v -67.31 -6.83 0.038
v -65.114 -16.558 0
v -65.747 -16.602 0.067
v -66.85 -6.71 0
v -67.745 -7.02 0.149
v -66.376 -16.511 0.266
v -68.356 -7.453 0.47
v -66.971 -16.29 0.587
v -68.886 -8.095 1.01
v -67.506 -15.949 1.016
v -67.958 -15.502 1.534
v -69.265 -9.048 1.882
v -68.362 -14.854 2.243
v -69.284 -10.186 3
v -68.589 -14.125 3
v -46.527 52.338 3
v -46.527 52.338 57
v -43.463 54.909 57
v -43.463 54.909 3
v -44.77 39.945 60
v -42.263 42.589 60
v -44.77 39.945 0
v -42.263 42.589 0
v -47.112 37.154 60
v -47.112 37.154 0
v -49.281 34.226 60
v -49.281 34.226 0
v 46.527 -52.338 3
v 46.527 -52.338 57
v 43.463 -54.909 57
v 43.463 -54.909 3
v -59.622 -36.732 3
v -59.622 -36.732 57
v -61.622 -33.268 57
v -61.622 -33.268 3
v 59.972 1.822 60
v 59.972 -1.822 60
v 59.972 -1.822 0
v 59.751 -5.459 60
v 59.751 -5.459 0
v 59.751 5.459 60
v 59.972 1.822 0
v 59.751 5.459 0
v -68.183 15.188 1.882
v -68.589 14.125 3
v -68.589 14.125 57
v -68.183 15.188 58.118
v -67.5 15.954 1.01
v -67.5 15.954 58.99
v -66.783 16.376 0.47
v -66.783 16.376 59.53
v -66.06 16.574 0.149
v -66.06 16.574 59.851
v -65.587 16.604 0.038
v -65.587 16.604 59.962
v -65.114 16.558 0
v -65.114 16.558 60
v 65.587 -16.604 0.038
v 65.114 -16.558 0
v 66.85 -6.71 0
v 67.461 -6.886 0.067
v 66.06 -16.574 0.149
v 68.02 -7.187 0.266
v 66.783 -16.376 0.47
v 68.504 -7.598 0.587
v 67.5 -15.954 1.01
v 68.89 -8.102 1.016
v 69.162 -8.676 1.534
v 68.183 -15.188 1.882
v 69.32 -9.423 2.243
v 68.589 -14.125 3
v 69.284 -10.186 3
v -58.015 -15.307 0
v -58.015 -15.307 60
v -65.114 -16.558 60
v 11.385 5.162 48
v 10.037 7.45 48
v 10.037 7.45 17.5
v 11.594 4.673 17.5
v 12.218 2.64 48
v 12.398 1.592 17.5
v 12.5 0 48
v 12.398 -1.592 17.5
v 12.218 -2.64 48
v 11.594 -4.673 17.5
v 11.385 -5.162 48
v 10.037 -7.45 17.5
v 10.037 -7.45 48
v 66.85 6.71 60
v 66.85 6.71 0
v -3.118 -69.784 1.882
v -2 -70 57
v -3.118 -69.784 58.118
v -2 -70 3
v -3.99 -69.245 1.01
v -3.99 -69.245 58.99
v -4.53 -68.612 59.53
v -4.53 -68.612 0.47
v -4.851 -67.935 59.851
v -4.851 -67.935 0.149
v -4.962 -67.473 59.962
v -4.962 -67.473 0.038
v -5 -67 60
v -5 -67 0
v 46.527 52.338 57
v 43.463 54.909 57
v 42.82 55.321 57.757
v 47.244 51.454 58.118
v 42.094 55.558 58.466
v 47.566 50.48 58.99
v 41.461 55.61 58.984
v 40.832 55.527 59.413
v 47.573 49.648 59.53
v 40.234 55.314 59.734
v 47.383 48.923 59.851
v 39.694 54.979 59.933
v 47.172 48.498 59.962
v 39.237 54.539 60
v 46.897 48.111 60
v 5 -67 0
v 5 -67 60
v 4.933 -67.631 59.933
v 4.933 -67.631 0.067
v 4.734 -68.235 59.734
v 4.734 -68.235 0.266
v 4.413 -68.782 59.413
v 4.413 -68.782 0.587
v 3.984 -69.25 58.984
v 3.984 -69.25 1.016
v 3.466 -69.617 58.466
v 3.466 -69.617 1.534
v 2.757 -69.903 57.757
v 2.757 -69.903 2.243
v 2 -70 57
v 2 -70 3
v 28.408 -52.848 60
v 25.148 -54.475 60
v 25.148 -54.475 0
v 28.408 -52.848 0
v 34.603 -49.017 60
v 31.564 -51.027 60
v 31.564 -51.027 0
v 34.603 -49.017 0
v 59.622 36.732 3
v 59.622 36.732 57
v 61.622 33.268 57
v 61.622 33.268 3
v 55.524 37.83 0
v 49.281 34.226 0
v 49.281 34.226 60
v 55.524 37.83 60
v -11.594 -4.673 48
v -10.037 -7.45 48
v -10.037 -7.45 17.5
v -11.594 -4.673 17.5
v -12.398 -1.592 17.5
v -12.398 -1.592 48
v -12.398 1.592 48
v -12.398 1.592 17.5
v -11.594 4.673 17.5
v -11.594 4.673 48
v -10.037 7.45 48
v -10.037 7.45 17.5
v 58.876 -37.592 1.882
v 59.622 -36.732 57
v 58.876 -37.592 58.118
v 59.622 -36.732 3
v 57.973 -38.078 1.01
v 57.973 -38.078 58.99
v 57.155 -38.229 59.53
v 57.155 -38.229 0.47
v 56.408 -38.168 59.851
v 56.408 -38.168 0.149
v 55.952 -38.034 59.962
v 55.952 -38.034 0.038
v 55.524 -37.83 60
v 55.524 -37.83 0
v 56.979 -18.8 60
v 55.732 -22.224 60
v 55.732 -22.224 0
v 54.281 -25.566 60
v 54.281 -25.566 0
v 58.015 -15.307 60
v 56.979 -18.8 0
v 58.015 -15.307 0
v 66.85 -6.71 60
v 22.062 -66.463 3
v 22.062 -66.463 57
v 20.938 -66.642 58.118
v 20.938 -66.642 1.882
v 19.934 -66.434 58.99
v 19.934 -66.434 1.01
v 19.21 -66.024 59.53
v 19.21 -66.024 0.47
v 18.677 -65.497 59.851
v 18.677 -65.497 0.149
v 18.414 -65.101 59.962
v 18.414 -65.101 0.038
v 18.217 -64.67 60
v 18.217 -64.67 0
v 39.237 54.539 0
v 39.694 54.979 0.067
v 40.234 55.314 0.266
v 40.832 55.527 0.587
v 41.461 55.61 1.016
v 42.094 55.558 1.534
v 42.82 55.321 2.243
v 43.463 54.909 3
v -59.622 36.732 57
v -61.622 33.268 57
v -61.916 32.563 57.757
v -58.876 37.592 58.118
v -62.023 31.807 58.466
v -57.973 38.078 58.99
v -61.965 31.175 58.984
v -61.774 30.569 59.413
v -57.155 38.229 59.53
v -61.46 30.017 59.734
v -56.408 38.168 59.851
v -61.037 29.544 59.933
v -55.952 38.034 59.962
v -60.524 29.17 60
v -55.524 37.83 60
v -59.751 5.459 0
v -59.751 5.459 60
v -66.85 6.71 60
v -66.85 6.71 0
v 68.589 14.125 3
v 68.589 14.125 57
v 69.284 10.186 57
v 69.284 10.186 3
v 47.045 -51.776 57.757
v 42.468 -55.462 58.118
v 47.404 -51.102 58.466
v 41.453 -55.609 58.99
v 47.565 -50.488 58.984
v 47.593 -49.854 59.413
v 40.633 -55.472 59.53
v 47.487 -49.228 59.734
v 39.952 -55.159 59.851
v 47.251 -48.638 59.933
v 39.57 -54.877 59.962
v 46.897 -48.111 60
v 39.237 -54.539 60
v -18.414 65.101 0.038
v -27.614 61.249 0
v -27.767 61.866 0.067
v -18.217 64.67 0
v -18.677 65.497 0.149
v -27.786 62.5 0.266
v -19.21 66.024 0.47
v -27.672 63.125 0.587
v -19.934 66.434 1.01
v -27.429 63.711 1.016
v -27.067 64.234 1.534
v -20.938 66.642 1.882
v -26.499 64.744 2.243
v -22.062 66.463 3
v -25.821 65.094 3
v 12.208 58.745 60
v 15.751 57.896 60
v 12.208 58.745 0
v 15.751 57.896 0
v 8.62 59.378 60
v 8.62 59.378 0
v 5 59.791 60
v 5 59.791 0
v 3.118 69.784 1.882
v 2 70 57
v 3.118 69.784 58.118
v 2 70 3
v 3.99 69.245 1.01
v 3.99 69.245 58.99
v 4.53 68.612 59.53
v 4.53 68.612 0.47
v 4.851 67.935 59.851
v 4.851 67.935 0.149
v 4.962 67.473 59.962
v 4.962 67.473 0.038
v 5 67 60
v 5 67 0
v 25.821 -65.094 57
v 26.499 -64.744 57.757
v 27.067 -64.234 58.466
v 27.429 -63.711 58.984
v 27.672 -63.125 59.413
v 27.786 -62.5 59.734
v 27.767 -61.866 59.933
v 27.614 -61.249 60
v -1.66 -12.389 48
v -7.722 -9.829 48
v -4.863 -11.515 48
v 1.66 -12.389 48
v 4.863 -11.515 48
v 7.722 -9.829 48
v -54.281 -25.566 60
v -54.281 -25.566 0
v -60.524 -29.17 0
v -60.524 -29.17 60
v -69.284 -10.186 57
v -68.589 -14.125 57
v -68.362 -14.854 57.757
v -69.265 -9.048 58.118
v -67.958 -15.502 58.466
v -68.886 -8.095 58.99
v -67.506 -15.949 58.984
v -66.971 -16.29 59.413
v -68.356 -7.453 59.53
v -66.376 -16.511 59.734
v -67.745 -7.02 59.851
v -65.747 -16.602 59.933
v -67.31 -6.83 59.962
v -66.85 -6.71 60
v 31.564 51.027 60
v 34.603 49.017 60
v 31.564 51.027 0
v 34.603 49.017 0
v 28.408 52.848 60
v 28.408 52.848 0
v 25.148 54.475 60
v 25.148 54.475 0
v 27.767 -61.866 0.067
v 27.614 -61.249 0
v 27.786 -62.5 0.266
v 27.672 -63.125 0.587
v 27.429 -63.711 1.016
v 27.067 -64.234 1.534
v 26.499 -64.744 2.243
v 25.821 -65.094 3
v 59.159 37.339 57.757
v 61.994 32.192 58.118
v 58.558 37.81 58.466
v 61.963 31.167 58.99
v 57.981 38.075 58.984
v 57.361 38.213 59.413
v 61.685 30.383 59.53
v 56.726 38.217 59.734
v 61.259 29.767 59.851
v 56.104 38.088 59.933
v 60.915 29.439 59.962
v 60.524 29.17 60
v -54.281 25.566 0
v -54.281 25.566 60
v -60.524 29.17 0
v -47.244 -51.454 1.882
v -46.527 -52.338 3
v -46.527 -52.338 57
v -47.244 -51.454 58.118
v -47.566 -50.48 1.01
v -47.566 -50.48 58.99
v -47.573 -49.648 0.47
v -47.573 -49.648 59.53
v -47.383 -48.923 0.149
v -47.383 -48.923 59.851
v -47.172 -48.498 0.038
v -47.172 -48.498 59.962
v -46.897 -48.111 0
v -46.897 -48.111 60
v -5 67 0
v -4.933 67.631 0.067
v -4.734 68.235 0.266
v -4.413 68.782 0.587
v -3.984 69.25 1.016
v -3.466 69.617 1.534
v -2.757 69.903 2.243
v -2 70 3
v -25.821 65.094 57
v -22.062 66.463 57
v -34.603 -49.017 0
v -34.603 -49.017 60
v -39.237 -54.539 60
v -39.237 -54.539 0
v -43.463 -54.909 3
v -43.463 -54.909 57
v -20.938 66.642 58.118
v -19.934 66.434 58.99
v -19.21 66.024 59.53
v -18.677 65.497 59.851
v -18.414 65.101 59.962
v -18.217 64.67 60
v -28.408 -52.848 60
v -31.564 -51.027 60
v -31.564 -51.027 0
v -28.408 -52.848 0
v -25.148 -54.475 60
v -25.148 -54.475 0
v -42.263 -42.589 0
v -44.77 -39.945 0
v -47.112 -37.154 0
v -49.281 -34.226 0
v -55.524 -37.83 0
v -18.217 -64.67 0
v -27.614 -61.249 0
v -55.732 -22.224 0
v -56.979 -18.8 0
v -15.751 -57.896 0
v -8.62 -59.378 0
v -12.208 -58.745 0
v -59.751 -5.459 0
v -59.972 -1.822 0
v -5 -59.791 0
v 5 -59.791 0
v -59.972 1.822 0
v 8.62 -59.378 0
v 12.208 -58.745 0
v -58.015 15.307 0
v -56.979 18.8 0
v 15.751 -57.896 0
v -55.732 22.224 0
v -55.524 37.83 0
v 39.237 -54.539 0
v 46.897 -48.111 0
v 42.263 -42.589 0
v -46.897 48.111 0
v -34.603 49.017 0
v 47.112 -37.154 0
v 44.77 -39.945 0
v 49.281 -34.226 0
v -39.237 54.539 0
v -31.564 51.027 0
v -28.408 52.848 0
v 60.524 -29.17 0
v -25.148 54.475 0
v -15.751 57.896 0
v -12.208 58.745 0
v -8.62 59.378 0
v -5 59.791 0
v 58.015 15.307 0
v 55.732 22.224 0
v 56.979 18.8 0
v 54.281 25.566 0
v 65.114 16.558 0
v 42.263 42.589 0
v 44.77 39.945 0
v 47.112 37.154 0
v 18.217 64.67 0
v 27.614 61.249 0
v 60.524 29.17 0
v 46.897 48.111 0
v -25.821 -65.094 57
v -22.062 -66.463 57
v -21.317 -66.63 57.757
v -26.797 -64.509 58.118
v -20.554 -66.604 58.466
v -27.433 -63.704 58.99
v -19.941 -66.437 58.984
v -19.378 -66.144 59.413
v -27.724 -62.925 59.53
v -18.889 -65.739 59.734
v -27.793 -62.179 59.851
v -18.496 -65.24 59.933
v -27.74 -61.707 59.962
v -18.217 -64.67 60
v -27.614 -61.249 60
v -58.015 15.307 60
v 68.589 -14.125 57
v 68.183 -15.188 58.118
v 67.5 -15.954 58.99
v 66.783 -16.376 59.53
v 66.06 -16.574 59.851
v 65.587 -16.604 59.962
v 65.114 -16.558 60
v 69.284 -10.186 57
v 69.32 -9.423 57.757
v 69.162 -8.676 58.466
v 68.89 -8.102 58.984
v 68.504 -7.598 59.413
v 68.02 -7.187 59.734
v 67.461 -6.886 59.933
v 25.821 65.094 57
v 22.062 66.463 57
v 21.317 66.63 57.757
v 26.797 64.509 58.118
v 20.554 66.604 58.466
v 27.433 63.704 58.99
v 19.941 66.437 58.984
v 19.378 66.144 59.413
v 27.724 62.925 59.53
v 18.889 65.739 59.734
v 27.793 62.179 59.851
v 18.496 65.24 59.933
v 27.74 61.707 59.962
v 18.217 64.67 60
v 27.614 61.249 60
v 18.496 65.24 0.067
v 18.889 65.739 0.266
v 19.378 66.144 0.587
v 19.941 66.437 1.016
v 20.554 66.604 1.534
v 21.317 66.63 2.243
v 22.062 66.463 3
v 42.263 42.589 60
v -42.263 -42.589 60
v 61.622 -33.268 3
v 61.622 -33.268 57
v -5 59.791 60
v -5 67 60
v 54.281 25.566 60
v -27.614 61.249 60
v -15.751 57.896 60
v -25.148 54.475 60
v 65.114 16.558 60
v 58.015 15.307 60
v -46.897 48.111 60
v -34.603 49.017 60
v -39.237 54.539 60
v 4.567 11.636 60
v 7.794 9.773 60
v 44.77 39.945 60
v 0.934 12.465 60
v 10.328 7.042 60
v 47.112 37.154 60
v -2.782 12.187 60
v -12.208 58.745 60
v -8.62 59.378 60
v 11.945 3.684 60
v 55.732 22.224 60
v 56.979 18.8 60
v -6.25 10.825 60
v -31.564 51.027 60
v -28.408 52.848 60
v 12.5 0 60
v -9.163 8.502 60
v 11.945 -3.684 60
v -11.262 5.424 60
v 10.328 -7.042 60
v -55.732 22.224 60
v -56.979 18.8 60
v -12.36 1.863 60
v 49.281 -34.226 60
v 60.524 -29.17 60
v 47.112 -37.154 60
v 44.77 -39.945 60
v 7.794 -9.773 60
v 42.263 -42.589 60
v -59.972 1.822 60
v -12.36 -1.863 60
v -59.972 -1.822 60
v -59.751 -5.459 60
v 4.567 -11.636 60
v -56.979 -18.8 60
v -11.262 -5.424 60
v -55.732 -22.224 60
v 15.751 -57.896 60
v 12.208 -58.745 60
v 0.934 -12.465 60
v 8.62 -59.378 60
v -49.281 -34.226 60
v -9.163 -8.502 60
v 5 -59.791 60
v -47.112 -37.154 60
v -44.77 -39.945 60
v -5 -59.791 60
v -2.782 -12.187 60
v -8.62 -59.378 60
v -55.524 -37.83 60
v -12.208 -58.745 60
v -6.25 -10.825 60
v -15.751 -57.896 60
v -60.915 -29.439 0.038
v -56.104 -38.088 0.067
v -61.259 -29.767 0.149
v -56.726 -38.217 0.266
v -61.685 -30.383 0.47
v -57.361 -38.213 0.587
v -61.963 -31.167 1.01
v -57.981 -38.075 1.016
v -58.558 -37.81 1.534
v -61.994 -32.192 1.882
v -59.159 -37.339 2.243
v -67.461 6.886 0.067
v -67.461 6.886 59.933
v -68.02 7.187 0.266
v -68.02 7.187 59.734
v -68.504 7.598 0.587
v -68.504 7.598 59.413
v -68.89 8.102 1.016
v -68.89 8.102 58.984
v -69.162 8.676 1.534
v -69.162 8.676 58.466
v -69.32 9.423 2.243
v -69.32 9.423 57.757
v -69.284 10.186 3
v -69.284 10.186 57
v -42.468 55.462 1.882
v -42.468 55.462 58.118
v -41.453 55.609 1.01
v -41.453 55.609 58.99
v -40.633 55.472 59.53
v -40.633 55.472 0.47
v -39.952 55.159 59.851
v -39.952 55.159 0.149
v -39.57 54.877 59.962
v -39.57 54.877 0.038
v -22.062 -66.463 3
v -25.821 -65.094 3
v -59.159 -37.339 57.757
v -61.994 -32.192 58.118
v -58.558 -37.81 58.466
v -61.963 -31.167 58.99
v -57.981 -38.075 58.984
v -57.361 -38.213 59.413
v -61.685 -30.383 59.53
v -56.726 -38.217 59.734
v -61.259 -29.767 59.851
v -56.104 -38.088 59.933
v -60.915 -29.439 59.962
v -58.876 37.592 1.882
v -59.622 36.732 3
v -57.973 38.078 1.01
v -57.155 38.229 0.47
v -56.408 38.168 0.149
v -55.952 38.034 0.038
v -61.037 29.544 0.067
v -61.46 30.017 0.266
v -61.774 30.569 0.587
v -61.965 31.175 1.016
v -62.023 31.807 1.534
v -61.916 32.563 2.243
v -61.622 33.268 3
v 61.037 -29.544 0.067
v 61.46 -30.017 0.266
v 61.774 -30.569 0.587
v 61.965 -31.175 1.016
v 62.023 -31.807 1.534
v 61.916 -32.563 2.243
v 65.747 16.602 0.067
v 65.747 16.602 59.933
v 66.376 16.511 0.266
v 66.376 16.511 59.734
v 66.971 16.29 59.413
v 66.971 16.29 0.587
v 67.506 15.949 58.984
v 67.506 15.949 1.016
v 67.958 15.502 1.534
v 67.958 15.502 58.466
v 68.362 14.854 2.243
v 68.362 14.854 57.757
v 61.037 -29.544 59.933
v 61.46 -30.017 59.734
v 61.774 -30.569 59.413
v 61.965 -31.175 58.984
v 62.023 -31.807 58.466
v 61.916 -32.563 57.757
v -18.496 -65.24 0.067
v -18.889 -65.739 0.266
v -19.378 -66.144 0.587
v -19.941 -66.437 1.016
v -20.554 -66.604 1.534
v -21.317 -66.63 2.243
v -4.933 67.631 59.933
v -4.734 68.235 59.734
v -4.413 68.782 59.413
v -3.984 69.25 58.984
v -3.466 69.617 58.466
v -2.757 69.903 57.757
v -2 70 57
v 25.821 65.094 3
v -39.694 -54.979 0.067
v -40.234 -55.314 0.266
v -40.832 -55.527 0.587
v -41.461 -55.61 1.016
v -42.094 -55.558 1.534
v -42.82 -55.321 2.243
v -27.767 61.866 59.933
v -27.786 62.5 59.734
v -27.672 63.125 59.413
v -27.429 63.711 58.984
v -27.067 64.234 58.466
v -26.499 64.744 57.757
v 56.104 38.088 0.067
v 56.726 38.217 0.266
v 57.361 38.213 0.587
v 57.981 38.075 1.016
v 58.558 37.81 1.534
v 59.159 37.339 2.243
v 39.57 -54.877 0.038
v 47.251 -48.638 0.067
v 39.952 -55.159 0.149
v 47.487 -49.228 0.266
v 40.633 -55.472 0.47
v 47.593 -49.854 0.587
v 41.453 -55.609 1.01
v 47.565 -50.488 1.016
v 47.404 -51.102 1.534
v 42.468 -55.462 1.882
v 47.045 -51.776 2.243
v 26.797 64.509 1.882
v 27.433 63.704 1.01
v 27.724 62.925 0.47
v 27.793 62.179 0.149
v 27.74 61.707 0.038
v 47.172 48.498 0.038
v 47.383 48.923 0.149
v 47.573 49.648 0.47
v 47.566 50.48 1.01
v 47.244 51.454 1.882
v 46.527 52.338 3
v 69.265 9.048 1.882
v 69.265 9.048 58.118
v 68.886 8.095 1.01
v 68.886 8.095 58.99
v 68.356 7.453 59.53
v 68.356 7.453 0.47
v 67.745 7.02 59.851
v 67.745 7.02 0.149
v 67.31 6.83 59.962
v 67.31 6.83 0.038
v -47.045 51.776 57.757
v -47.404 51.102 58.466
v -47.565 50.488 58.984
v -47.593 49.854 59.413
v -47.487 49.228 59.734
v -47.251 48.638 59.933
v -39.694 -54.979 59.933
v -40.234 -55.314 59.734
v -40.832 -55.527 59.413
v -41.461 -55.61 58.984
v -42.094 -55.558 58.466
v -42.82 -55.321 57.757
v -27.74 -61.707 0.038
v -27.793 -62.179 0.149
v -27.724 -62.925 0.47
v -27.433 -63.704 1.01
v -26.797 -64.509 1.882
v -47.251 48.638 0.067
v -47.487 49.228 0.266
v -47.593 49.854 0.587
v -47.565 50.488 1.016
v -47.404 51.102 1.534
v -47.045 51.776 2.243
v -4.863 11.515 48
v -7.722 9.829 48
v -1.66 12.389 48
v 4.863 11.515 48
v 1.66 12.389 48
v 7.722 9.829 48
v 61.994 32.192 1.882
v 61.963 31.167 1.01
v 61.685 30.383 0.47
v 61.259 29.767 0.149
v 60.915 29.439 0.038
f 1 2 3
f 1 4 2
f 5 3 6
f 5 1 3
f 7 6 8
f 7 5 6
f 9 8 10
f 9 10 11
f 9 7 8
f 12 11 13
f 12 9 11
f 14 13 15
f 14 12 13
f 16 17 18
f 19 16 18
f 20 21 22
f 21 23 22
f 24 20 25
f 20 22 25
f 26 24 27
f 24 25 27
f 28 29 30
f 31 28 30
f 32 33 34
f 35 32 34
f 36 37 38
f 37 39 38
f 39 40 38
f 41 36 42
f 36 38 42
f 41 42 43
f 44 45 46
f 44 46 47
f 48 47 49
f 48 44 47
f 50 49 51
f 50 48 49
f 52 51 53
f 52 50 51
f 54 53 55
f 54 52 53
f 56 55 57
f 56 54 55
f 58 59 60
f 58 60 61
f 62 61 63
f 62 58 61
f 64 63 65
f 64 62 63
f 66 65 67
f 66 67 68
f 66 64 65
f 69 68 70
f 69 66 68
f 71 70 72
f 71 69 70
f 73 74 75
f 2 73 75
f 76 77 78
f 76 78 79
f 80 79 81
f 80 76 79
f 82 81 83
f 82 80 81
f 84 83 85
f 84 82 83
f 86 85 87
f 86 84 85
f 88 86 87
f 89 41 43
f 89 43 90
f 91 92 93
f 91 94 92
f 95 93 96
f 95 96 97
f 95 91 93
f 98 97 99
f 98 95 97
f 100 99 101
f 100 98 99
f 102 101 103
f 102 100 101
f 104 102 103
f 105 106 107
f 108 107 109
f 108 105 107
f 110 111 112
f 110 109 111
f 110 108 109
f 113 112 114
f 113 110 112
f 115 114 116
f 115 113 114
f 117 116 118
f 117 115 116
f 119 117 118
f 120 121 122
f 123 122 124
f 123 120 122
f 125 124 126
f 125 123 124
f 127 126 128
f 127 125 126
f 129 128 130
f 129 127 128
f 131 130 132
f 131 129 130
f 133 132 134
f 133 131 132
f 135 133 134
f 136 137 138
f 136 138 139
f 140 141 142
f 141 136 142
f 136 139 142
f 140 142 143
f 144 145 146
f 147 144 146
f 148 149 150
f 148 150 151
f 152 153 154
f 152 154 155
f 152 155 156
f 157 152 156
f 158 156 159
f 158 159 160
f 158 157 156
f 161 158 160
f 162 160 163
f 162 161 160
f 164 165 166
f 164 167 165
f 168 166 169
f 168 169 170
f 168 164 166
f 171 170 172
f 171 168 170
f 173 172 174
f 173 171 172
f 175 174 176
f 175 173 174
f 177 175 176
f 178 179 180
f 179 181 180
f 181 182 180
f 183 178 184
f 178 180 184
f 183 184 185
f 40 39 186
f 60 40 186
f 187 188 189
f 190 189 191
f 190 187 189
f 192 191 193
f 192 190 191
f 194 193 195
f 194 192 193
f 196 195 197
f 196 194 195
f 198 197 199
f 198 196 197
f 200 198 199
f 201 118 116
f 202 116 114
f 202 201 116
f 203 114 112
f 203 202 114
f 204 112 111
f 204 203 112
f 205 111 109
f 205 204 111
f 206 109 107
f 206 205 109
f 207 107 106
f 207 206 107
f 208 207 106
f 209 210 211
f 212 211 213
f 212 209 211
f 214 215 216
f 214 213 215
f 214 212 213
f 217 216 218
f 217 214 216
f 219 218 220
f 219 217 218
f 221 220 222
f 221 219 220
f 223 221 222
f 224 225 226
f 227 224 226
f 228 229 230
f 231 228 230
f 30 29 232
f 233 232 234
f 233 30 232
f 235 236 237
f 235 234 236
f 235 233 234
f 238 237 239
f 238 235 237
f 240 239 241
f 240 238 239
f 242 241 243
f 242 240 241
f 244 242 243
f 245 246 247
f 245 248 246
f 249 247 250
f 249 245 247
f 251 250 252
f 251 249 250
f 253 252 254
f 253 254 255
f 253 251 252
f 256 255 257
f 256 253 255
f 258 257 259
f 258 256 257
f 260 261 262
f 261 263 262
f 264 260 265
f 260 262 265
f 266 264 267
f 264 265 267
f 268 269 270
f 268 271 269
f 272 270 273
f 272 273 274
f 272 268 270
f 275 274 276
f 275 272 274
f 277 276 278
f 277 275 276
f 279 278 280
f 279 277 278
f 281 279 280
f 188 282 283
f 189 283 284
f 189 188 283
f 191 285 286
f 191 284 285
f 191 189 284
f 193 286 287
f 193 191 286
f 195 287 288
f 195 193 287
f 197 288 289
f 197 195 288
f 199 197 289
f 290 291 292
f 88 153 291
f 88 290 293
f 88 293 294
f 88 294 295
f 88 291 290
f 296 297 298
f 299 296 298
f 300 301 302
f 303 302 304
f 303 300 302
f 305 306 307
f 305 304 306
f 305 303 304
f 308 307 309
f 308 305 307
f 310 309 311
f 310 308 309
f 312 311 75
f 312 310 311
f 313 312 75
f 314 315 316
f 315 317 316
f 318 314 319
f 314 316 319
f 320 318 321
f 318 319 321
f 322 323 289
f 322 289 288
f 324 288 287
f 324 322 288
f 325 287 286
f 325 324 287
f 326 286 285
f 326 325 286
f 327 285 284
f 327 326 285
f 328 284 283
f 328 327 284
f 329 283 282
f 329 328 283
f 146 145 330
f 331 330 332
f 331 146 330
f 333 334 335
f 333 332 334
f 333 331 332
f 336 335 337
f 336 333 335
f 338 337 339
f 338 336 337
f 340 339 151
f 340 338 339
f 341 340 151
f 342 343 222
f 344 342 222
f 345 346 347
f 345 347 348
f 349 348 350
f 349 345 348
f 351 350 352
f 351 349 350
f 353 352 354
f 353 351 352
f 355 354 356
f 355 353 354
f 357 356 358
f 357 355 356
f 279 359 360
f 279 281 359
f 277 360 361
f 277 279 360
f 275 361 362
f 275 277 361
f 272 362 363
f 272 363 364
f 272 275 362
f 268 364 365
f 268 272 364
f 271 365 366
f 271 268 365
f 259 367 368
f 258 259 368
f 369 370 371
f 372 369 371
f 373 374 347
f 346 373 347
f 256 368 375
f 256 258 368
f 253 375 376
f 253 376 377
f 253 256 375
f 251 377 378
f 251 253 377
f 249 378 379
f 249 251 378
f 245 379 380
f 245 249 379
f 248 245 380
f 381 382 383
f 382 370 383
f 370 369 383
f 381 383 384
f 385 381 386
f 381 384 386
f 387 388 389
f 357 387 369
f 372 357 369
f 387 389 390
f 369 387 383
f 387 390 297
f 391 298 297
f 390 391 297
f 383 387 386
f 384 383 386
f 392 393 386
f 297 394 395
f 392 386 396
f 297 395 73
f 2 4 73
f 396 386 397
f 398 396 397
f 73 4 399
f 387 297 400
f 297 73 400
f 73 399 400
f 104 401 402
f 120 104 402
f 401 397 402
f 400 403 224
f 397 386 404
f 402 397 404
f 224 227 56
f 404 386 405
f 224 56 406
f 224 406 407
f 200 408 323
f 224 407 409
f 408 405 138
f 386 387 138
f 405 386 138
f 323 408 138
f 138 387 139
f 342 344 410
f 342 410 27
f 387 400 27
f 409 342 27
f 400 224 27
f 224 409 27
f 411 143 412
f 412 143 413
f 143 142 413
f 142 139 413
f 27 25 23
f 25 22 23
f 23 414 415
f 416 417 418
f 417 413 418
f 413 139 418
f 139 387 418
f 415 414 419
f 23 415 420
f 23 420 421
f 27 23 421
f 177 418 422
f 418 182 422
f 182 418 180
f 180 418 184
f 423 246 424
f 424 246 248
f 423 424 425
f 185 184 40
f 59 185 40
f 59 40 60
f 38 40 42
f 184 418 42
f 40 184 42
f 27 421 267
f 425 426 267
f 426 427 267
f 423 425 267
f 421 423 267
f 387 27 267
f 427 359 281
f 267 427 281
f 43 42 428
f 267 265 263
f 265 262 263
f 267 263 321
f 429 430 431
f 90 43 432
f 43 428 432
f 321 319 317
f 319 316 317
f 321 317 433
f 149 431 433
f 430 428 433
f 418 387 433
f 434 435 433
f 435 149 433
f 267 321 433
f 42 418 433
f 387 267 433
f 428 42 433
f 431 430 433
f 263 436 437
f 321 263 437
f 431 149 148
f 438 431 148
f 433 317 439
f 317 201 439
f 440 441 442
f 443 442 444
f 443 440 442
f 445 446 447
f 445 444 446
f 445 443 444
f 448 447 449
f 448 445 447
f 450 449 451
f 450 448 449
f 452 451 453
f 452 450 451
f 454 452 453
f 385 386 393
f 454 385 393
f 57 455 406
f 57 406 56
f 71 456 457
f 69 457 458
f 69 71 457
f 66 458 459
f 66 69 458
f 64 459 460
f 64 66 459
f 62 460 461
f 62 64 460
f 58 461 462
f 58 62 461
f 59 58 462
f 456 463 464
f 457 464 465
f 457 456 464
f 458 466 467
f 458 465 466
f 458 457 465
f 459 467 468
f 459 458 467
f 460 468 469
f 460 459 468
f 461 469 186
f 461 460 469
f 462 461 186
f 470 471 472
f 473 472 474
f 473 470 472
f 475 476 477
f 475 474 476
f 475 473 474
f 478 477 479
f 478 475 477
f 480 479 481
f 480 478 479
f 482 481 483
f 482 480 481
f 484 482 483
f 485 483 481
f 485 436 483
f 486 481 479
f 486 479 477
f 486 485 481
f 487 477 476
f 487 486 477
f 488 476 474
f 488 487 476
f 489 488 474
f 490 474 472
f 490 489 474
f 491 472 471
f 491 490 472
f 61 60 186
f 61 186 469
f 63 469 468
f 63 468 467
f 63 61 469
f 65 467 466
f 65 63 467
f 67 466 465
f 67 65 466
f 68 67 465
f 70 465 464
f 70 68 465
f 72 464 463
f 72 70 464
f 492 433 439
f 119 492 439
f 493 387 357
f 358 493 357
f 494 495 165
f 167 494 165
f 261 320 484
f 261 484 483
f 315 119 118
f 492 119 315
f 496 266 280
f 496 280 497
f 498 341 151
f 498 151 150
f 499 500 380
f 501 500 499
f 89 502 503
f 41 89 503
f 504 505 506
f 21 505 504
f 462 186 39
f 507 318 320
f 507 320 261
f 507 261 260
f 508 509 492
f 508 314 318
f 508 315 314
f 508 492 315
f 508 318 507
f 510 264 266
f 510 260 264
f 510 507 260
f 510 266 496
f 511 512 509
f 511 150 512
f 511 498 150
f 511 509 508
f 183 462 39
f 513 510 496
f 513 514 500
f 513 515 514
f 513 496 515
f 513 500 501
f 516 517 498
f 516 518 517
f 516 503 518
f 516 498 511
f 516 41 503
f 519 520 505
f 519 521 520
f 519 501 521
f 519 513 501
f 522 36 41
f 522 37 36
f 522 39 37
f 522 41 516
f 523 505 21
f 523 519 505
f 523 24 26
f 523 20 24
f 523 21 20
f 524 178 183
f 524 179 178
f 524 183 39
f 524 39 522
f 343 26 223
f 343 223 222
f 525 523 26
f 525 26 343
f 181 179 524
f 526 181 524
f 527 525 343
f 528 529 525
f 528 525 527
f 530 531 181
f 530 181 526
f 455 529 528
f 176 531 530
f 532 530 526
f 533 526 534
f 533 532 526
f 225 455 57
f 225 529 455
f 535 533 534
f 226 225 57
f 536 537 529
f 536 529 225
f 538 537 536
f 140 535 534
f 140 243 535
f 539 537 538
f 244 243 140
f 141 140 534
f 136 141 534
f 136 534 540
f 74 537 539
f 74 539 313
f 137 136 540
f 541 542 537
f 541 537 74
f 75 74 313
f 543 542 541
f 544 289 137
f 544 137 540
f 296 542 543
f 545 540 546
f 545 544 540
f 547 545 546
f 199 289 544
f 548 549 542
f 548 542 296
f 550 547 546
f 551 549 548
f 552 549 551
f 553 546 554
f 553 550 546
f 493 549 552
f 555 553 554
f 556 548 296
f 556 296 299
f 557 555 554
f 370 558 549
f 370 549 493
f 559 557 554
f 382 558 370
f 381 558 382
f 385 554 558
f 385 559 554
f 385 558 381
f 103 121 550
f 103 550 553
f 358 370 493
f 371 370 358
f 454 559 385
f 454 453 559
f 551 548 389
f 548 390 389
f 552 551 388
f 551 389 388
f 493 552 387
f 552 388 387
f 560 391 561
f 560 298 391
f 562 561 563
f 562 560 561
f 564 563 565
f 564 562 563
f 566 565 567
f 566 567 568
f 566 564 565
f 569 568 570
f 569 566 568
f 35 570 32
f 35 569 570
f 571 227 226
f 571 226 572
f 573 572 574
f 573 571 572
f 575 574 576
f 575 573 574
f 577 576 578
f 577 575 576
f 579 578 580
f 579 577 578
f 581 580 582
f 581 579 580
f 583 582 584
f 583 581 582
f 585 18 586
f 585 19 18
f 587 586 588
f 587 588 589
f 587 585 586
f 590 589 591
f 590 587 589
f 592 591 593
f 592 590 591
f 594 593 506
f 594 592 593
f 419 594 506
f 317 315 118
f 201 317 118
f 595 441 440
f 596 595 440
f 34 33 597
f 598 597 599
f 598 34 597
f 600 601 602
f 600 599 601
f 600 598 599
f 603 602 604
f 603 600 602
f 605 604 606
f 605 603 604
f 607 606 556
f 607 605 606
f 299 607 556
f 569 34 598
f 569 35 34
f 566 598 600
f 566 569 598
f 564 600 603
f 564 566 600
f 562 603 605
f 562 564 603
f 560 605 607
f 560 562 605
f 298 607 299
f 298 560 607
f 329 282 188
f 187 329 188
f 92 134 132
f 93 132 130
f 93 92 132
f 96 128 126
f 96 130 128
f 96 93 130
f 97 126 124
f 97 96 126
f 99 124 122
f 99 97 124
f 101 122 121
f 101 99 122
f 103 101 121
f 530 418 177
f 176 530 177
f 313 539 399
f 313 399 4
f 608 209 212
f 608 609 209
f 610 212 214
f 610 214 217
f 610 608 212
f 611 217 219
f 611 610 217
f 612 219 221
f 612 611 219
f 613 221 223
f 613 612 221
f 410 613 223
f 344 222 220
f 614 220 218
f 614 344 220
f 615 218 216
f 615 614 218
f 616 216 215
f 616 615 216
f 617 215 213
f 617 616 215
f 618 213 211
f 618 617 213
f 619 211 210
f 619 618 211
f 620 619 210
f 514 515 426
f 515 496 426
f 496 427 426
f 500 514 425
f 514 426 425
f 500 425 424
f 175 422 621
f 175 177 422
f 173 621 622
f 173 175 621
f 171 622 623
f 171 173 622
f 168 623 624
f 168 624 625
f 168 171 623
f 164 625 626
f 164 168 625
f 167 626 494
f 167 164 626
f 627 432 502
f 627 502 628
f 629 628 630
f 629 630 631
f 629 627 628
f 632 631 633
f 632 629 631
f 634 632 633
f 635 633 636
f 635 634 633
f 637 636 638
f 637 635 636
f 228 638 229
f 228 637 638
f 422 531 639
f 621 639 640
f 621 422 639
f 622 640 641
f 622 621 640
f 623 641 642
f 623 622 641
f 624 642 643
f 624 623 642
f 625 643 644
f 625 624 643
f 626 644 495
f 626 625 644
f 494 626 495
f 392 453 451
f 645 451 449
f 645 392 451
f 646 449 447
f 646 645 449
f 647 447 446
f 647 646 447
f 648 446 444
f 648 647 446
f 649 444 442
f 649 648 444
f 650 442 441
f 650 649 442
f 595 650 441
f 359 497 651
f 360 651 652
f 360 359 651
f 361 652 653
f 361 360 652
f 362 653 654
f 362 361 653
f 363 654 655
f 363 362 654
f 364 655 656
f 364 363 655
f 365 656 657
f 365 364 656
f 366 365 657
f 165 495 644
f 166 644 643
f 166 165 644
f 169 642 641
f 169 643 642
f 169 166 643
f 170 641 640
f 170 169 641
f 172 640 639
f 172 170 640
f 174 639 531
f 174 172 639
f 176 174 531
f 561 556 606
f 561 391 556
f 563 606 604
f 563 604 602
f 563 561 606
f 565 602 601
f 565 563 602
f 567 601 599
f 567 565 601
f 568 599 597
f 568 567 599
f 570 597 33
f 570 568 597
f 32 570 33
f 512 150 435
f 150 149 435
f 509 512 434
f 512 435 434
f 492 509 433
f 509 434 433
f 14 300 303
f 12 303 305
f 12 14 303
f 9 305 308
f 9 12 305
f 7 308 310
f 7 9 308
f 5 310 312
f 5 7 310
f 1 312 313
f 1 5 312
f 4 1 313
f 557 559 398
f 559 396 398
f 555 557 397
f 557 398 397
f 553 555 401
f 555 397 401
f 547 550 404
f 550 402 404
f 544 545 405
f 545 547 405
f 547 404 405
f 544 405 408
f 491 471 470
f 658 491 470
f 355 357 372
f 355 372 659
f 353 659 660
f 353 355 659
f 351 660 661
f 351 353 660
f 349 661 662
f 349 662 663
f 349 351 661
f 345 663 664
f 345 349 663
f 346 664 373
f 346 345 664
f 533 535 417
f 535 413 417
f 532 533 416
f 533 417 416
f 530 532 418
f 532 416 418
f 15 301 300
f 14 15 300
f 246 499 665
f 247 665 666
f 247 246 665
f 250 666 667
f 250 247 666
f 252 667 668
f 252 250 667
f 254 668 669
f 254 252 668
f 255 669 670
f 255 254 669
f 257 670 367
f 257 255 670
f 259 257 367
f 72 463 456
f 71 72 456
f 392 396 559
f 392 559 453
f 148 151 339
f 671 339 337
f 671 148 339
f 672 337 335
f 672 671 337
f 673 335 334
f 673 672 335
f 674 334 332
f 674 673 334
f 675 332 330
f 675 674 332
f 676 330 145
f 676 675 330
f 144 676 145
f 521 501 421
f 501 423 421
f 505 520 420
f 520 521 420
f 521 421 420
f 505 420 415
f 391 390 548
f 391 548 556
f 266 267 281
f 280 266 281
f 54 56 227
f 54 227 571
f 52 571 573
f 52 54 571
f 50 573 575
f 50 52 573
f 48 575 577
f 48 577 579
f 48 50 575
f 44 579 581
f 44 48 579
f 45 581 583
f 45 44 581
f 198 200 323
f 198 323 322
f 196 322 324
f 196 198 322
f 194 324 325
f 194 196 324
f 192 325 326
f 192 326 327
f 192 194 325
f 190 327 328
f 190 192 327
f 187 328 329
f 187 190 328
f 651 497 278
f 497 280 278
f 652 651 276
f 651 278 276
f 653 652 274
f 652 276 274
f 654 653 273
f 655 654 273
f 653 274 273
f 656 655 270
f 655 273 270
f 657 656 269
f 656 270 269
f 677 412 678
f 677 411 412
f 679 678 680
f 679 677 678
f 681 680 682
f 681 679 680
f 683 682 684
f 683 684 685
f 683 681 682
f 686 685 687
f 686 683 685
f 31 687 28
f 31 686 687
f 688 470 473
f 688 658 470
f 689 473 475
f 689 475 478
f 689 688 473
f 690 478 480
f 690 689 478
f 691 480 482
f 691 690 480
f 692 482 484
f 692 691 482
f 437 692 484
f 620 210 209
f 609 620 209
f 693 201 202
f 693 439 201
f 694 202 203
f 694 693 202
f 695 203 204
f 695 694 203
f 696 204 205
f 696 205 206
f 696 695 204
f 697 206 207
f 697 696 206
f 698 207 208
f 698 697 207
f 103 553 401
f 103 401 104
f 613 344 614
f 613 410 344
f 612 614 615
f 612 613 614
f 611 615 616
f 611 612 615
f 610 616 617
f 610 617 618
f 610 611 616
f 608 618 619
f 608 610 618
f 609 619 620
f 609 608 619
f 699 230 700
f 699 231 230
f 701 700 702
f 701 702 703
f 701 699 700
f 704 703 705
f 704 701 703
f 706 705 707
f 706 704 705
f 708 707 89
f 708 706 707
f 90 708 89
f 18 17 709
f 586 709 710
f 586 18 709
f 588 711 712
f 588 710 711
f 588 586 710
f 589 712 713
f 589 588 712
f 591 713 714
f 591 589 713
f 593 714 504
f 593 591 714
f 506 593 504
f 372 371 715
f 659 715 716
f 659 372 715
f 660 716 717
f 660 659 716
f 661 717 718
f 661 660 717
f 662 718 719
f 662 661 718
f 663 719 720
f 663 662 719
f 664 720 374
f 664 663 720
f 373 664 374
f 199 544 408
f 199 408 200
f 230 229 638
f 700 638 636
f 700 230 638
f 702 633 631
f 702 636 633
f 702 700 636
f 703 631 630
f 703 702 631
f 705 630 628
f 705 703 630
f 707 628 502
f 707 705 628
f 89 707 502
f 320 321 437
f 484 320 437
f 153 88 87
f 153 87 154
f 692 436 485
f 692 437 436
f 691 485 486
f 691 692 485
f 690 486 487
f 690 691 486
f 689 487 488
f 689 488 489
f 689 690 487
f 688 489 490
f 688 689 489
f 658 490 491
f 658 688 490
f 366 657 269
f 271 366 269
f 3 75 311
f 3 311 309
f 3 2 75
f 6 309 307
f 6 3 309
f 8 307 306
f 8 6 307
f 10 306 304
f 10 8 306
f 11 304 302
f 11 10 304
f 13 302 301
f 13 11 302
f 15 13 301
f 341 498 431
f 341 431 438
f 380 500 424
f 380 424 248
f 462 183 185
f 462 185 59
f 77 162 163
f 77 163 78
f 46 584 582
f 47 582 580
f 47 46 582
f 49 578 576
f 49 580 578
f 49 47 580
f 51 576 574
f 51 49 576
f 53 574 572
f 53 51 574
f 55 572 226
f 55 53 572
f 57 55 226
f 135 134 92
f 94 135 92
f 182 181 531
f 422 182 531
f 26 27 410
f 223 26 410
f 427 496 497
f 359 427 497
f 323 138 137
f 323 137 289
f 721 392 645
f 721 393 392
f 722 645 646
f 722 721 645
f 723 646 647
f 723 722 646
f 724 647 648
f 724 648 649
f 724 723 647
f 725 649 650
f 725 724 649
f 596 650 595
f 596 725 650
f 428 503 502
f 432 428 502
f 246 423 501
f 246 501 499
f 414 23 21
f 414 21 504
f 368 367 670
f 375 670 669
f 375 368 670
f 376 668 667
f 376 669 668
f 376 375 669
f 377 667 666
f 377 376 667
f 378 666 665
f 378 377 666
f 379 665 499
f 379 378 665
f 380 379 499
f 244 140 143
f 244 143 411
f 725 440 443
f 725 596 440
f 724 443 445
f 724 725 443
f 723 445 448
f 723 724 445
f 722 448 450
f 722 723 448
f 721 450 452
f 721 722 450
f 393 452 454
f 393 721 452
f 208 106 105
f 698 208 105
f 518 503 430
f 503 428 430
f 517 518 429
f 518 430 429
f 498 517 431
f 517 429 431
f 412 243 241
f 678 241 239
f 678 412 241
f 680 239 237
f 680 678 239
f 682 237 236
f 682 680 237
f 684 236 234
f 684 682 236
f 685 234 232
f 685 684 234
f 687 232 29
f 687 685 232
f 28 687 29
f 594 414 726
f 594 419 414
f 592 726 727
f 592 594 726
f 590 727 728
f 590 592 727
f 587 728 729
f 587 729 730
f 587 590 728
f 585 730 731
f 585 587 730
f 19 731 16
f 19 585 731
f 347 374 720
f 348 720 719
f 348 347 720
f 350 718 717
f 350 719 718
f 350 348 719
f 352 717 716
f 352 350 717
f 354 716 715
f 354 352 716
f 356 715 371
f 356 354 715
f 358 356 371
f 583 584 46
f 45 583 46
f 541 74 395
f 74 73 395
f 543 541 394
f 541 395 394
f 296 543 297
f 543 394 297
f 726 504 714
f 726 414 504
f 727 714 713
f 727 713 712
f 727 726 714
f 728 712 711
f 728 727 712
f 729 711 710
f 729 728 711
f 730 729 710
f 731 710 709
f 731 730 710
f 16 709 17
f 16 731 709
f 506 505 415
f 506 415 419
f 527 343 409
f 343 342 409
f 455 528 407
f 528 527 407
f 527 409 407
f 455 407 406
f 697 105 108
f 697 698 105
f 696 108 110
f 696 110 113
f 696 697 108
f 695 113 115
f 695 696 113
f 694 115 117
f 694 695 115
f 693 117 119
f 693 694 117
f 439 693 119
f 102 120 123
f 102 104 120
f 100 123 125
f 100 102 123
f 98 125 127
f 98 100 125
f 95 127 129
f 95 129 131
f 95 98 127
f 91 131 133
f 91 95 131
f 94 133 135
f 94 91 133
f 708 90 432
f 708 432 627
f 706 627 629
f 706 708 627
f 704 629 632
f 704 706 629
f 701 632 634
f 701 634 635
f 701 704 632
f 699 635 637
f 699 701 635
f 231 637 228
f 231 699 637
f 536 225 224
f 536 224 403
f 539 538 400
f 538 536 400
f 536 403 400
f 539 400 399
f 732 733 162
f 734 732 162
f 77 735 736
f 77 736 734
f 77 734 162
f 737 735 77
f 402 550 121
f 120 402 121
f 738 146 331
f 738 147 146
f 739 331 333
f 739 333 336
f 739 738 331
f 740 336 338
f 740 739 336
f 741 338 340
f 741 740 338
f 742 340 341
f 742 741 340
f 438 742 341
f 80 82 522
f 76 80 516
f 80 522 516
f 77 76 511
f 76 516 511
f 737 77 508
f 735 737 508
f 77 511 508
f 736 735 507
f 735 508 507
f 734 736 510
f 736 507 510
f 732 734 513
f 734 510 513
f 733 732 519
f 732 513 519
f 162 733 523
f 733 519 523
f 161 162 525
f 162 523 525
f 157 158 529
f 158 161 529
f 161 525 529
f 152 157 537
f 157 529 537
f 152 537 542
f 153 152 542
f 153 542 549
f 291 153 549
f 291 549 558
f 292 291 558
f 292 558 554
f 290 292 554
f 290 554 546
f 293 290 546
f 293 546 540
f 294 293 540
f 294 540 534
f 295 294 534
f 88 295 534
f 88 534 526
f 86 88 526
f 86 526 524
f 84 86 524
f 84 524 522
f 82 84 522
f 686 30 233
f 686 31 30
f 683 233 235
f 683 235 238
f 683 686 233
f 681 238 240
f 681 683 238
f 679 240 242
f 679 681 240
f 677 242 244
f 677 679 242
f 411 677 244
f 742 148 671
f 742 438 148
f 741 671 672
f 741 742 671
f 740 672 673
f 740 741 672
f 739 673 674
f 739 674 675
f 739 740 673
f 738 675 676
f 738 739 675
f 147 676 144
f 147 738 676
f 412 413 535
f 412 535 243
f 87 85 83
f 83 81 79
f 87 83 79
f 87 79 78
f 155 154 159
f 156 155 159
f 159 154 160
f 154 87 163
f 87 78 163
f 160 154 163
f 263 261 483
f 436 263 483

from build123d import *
from build123d.topology import SkipClean

# Parameters (mm, degrees)
SKETCH2_R                = 60
BOSS_EXTRUDE1_DEPTH      = 60
SKETCH3_W                = 10
SKETCH3_H                = 10.47851478
BOSS_EXTRUDE2_DEPTH      = 60
FILLET2_R                = 3
CIRPATTERN1_COUNT        = 18
FILLET2_OF_CIRPATTERN1_R = 3
SKETCH4_R                = 10
CUT_EXTRUDE1_DEPTH       = 60
SKETCH5_R                = 22.481820488
BOSS_EXTRUDE3_DEPTH      = 60
SKETCH6_R                = 12.5
CUT_EXTRUDE2_DEPTH       = 12
CUT_EXTRUDE3_DEPTH       = 30.5


with BuildPart() as part:
    # Sketch2 → Boss-Extrude1 (new body)
    with BuildSketch(Plane.XY):
        Circle(SKETCH2_R)
    extrude(amount=BOSS_EXTRUDE1_DEPTH)

    # Sketch3 → Boss-Extrude2 (add)
    with BuildSketch(Plane.XY.offset(60)):
        with Locations((0, 64.76074261)):
            Rectangle(SKETCH3_W, SKETCH3_H)
    boss_extrude2 = extrude(amount=-BOSS_EXTRUDE2_DEPTH)

    # Fillet2
    fillet2_edges = [part.edges().sort_by_distance(p)[0] for p in [
        (5, 70, 30),
        (0, 70, 0),
        (-5, 70, 30),
        (0, 70, 60),
    ]]
    fillet(fillet2_edges, radius=FILLET2_R)

    # CirPattern1: Boss-Extrude2 ×18 about axis
    cirpattern1_axis = Axis((0, 0, 0), (0, 0, 1))
    for i in range(1, CIRPATTERN1_COUNT):
        add(boss_extrude2.rotate(cirpattern1_axis, i * 360 / CIRPATTERN1_COUNT))

    # Fillet2 of CirPattern1
    fillet2_of_cirpattern1_edges = [part.edges().sort_by_distance(p)[0] for p in [
        (-19.242946929, 67.488584172, 30),
        (-23.941410033, 65.778483455, 0),
        (-28.639873137, 64.068382738, 30),
        (-23.941410033, 65.778483455, 60),
        (-41.164910462, 56.837049067, 30),
        (-44.995132678, 53.623111018, 0),
        (-48.825354894, 50.40917297, 30),
        (-44.995132678, 53.623111018, 60),
        (-58.121778265, 39.330127019, 30),
        (-60.621778265, 35, 0),
        (-63.121778265, 30.669872981, 30),
        (-60.621778265, 35, 60),
        (-68.068301823, 17.079411202, 30),
        (-68.936542711, 12.155372437, 0),
        (-69.804783599, 7.231333672, 30),
        (-68.936542711, 12.155372437, 60),
        (-69.804783599, -7.231333672, 30),
        (-68.936542711, -12.155372437, 0),
        (-68.068301823, -17.079411202, 30),
        (-68.936542711, -12.155372437, 60),
        (-63.121778265, -30.669872981, 30),
        (-60.621778265, -35, 0),
        (-58.121778265, -39.330127019, 30),
        (-60.621778265, -35, 60),
        (-48.825354894, -50.40917297, 30),
        (-44.995132678, -53.623111018, 0),
        (-41.164910462, -56.837049067, 30),
        (-44.995132678, -53.623111018, 60),
        (-28.639873137, -64.068382738, 30),
        (-23.941410033, -65.778483455, 0),
        (-19.242946929, -67.488584172, 30),
        (-23.941410033, -65.778483455, 60),
        (-5, -70, 30),
        (0, -70, 0),
        (5, -70, 30),
        (0, -70, 60),
        (19.242946929, -67.488584172, 30),
        (23.941410033, -65.778483455, 0),
        (28.639873137, -64.068382738, 30),
        (23.941410033, -65.778483455, 60),
        (41.164910462, -56.837049067, 30),
        (44.995132678, -53.623111018, 0),
        (48.825354894, -50.40917297, 30),
        (44.995132678, -53.623111018, 60),
        (58.121778265, -39.330127019, 30),
        (60.621778265, -35, 0),
        (63.121778265, -30.669872981, 30),
        (60.621778265, -35, 60),
        (68.068301823, -17.079411202, 30),
        (68.936542711, -12.155372437, 0),
        (69.804783599, -7.231333672, 30),
        (68.936542711, -12.155372437, 60),
        (69.804783599, 7.231333672, 30),
        (68.936542711, 12.155372437, 0),
        (68.068301823, 17.079411202, 30),
        (68.936542711, 12.155372437, 60),
        (63.121778265, 30.669872981, 30),
        (60.621778265, 35, 0),
        (58.121778265, 39.330127019, 30),
        (60.621778265, 35, 60),
        (48.825354894, 50.40917297, 30),
        (44.995132678, 53.623111018, 0),
        (41.164910462, 56.837049067, 30),
        (44.995132678, 53.623111018, 60),
        (28.639873137, 64.068382738, 30),
        (23.941410033, 65.778483455, 0),
        (19.242946929, 67.488584172, 30),
        (23.941410033, 65.778483455, 60),
    ]]
    fillet(fillet2_of_cirpattern1_edges, radius=FILLET2_OF_CIRPATTERN1_R)

    # Sketch4 → Cut-Extrude1 (cut)
    with BuildSketch(Plane.XY.offset(60)):
        Circle(SKETCH4_R)
    extrude(amount=-CUT_EXTRUDE1_DEPTH, mode=Mode.SUBTRACT)

    # Sketch5 → Boss-Extrude3 (add)
    with BuildSketch(Plane.XY.offset(60)):
        Circle(SKETCH5_R)
    extrude(amount=-BOSS_EXTRUDE3_DEPTH)

    # Sketch6 → Cut-Extrude2 (cut)
    with BuildSketch(Plane.XY.offset(60)):
        Circle(SKETCH6_R)
    extrude(amount=-CUT_EXTRUDE2_DEPTH, mode=Mode.SUBTRACT)

    # Sketch7 → Cut-Extrude3 (cut)
    with SkipClean():  # the faces are left unmerged after this step: merging them gives an invalid solid
        with BuildSketch(Plane.XY.offset(48)):
            with BuildLine():
                Line((10.037305415, -7.45), (-10.037305415, -7.45))
                ThreePointArc((-10.037305415, -7.45), (-12.5, 0), (-10.037305415, 7.45))
                Line((-10.037305415, 7.45), (10.037305415, 7.45))
                ThreePointArc((10.037305415, 7.45), (12.5, 0), (10.037305415, -7.45))
            make_face()
        extrude(amount=-CUT_EXTRUDE3_DEPTH, mode=Mode.SUBTRACT)


solid = part.part
